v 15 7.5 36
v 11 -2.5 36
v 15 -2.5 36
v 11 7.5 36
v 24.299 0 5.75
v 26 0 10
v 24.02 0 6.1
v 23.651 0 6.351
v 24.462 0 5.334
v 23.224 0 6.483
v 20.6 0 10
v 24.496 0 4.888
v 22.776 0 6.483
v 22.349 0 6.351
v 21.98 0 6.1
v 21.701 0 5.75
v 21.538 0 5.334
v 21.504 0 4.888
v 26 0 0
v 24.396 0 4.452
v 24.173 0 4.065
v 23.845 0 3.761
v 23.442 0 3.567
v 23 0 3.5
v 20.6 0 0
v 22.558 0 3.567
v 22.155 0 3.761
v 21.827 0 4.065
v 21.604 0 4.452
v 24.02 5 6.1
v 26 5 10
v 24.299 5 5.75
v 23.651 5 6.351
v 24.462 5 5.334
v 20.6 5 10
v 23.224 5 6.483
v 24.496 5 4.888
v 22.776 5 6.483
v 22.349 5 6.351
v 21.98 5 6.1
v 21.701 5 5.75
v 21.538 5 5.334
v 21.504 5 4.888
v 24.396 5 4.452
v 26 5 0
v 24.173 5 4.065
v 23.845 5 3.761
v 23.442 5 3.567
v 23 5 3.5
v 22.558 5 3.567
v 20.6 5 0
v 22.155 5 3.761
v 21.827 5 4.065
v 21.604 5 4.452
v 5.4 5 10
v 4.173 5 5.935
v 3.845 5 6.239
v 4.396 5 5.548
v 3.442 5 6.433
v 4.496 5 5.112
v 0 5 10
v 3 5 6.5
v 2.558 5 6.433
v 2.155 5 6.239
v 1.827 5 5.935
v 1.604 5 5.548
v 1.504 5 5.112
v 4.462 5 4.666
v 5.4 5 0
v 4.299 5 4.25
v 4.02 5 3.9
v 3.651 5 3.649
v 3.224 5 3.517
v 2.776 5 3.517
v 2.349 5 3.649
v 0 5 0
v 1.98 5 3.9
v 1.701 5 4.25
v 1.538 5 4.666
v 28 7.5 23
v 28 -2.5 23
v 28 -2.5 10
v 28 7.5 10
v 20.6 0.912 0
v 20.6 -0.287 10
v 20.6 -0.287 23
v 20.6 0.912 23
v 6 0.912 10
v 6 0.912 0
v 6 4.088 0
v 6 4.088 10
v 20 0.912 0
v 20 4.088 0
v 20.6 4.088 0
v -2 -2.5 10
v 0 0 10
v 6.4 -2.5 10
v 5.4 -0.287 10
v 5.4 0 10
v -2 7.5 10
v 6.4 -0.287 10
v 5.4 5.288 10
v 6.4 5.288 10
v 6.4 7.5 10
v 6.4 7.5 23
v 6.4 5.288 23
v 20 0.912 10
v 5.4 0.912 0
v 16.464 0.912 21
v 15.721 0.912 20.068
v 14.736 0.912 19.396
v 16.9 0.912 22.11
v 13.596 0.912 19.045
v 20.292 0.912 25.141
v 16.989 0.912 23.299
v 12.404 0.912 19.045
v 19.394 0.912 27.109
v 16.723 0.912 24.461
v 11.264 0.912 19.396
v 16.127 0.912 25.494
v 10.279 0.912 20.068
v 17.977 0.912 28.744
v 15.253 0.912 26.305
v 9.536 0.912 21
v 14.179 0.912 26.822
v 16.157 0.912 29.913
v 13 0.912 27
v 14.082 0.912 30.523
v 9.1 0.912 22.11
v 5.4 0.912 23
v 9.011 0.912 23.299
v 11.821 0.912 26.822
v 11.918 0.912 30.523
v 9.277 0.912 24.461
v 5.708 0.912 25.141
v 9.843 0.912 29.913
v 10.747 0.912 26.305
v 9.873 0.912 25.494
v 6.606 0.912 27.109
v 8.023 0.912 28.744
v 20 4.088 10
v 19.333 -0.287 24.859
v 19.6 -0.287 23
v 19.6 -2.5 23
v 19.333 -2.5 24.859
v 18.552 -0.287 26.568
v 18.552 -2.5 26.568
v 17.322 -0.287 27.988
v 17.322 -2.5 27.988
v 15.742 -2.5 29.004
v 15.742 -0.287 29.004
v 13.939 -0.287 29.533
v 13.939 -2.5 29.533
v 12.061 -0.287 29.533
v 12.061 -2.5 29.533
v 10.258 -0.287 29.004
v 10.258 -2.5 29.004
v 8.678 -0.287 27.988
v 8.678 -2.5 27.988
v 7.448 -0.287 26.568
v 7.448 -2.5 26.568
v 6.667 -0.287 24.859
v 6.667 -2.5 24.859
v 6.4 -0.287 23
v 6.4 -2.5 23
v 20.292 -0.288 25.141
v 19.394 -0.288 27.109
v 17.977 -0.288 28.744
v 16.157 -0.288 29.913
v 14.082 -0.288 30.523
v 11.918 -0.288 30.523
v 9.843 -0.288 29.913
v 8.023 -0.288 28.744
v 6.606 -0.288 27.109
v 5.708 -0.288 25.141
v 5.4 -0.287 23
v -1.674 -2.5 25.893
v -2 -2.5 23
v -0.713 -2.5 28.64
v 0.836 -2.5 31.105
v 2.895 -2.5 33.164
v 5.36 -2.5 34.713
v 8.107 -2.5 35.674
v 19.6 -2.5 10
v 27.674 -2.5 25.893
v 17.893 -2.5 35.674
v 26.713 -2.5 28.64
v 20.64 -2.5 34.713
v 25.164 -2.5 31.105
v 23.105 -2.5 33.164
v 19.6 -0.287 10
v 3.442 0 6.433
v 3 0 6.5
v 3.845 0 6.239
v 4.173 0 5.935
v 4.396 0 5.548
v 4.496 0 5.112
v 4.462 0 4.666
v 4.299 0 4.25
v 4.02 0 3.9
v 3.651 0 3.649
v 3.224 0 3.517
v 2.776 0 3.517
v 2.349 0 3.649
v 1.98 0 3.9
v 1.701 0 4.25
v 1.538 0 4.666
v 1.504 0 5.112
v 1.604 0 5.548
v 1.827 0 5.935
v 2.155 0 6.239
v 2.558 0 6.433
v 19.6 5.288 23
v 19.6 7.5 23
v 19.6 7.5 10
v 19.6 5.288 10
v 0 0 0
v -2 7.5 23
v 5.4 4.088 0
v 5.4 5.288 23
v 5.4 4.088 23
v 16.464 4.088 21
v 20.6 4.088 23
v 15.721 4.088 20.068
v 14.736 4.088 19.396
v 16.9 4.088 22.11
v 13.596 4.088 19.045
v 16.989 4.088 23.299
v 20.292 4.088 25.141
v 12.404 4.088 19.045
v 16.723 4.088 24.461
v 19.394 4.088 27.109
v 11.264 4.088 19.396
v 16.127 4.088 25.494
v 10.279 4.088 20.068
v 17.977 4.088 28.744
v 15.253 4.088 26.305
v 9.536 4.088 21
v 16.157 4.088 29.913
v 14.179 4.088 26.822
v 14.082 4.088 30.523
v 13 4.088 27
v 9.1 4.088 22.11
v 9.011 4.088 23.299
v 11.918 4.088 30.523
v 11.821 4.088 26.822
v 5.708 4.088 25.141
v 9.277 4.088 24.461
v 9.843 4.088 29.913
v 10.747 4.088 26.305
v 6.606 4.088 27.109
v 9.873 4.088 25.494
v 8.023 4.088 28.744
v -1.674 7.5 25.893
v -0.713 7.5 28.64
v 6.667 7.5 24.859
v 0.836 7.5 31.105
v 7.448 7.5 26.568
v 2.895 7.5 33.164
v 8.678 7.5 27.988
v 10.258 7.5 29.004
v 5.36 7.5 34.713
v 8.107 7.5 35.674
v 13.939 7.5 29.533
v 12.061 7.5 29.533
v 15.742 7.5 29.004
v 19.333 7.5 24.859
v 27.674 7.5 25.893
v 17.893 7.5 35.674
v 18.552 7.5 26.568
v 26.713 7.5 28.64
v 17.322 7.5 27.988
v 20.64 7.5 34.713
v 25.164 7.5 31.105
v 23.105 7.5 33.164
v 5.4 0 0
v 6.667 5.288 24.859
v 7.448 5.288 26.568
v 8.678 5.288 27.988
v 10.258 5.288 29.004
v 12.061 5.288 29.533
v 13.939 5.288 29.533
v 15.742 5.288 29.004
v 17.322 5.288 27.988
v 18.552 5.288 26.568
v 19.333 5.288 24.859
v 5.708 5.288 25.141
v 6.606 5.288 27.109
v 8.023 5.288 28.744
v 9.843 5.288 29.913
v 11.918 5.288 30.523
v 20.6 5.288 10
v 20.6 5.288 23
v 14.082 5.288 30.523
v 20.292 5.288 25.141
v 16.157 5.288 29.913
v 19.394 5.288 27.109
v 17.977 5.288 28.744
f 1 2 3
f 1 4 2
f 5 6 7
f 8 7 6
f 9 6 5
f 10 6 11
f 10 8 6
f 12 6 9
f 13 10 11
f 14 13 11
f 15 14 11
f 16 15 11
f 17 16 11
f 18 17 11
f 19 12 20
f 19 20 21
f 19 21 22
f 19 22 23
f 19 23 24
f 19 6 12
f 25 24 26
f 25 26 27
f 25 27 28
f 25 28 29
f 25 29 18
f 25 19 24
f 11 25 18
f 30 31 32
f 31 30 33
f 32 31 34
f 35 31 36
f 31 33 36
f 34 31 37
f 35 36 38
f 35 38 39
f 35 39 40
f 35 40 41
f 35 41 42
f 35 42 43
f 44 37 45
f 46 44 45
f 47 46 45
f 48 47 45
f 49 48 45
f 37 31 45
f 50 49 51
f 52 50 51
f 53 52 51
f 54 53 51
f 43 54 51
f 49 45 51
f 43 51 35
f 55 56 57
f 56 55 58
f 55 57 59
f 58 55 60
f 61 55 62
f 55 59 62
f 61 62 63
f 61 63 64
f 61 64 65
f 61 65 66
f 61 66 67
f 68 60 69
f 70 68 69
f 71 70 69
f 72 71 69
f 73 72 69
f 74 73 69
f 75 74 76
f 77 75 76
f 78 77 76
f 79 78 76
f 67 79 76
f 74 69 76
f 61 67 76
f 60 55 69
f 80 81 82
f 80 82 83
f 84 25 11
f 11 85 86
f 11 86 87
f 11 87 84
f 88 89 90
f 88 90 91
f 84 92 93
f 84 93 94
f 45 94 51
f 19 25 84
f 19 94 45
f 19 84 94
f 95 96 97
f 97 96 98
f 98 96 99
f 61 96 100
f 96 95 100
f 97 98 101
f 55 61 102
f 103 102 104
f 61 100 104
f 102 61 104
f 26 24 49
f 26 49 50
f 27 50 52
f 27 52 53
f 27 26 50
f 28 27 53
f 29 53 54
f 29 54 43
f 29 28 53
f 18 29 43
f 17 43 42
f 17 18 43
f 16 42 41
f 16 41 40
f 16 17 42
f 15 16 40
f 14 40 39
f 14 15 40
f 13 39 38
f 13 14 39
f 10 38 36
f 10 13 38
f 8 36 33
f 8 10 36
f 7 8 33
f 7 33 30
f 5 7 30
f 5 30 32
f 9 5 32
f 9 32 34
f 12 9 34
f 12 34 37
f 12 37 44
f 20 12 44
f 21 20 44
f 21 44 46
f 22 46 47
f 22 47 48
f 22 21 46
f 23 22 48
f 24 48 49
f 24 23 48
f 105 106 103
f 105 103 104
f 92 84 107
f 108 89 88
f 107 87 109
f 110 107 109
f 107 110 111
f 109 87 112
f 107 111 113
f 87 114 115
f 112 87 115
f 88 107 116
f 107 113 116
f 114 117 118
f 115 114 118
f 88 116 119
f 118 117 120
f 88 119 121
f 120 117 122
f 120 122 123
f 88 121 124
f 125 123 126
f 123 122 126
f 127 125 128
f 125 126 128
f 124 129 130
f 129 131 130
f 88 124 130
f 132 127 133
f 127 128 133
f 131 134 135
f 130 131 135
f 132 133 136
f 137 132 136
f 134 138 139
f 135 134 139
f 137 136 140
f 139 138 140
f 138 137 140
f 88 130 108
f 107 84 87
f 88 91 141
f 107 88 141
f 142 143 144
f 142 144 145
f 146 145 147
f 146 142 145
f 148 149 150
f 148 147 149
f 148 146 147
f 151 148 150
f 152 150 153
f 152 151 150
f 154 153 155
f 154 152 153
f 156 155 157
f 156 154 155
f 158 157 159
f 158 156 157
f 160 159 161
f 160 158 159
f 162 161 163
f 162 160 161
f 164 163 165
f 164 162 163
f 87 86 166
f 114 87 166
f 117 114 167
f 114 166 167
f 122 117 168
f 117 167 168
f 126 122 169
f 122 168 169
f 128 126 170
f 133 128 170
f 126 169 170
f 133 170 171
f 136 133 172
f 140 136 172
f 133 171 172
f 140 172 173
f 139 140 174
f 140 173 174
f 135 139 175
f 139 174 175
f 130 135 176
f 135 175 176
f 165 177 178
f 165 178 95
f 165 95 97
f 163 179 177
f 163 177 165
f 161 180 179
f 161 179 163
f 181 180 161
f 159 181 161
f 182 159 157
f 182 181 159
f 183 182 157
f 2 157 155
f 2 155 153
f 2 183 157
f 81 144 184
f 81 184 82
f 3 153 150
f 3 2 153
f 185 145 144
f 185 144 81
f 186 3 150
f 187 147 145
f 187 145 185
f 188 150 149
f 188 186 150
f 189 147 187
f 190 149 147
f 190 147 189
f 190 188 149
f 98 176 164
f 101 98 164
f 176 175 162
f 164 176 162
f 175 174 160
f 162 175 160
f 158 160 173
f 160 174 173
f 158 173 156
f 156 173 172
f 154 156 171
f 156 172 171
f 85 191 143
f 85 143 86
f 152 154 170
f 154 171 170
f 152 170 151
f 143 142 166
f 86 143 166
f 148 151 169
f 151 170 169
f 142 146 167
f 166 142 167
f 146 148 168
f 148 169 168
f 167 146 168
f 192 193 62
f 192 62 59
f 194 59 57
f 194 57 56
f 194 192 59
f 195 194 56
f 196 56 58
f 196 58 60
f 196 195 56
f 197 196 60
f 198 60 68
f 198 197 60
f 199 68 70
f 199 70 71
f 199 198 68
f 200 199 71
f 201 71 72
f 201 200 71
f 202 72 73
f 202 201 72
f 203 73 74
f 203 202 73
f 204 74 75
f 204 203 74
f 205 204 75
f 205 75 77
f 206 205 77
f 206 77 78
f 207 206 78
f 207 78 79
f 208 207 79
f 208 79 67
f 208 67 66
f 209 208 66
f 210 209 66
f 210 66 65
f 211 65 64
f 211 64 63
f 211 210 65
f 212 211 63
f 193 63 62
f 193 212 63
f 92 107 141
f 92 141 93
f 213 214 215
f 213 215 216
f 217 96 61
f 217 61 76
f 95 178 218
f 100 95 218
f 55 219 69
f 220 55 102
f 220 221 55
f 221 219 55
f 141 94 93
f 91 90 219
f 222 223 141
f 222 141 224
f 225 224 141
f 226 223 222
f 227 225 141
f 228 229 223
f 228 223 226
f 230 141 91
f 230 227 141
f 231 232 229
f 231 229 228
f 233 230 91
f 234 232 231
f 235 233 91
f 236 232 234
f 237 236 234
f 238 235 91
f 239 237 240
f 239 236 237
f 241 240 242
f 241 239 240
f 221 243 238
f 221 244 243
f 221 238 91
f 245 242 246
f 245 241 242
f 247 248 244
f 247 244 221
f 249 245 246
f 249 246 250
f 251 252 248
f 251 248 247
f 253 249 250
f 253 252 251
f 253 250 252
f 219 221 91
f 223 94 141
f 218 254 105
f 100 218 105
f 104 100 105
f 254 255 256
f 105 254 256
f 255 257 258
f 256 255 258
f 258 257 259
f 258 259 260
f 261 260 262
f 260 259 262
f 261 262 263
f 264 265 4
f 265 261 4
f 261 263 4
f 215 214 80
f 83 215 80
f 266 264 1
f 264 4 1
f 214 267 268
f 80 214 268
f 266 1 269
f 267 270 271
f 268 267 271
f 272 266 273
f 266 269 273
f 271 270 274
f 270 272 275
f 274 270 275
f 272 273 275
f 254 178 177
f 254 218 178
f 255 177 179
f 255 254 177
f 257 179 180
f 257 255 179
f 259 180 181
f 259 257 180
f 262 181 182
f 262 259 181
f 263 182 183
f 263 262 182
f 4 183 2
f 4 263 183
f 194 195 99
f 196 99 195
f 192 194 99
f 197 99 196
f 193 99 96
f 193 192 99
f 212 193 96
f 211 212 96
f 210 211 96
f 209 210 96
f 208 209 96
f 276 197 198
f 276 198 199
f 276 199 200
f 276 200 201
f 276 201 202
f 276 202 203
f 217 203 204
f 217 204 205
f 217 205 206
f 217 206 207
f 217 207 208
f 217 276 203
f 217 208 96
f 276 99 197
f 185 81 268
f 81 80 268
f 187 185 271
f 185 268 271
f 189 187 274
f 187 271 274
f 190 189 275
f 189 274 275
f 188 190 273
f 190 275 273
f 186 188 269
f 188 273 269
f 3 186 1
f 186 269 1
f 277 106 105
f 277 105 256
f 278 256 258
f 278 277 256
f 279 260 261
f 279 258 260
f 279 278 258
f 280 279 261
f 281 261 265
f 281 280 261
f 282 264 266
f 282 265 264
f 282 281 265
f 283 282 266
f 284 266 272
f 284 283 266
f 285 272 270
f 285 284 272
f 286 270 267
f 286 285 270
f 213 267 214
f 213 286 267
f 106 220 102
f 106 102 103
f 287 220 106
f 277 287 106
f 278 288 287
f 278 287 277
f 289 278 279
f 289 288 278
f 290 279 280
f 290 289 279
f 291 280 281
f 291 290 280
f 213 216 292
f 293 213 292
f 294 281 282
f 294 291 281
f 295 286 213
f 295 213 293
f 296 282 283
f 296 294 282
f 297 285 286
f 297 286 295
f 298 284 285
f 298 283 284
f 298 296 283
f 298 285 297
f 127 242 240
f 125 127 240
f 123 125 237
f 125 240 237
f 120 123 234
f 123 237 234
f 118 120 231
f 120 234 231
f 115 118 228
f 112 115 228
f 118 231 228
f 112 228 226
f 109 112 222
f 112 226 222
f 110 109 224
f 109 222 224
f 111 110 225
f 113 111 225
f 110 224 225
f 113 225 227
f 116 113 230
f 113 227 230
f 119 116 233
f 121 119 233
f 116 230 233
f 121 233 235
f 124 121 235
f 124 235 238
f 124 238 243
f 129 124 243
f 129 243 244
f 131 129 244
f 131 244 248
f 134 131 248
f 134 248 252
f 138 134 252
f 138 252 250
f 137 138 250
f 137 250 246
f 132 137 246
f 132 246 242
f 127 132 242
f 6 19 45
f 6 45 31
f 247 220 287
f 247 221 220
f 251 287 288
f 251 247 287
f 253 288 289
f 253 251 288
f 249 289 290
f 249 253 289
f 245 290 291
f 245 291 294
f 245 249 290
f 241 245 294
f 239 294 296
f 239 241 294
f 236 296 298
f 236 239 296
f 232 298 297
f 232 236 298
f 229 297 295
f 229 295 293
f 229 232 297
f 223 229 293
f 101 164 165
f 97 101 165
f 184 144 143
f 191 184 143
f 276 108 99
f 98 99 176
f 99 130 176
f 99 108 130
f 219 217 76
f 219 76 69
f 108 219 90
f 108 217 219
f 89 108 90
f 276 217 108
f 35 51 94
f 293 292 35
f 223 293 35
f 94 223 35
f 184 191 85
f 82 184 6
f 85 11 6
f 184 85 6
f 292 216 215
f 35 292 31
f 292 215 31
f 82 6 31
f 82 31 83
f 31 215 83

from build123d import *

# Parameters (mm, degrees)
SKETCH1_R           = 1.5
BOSS_EXTRUDE1_DEPTH = 5
SKETCH2_W           = 30
SKETCH2_H           = 2.5
BOSS_EXTRUDE2_DEPTH = 26
FILLET1_R           = 13
CUT_EXTRUDE1_START  = -13
CUT_EXTRUDE1_DEPTH  = 52.939054945
SKETCH4_R           = 7.6
CUT_EXTRUDE2_DEPTH  = 1.2
SKETCH5_R           = 6.6
CUT_EXTRUDE3_DEPTH  = 47.080312024
CUT_EXTRUDE4_START  = 1.2
SKETCH6_R           = 7.6
CUT_EXTRUDE4_DEPTH  = 1.2
SKETCH7_R           = 6.6
CUT_EXTRUDE5_DEPTH  = 47.080312024
SKETCH8_R           = 4
CUT_EXTRUDE6_DEPTH  = 47.080312024


with BuildPart() as part:
    # Sketch1 → Boss-Extrude1 (new body)
    with BuildSketch(Plane(origin=(0, 0, 0), x_dir=(1, 0, 0), z_dir=(0, 1, 0))):
        Polygon((0, 0), (6, 0), (6, -10), (20, -10), (20, 0), (26, 0), (26, -10), (28, -10), (28, -36), (-2, -36), (-2, -10), (0, -10), align=None)
        with Locations(Location((3, -5, 0), (0, 0, 270))):
            Circle(SKETCH1_R, mode=Mode.SUBTRACT)
        with Locations(Location((23, -5, 0), (0, 0, 90))):
            Circle(SKETCH1_R, mode=Mode.SUBTRACT)
    extrude(amount=BOSS_EXTRUDE1_DEPTH)

    # Sketch2 → Boss-Extrude2 (add)
    with BuildSketch(Plane.XY.offset(36)):
        with Locations((13, 6.25)):
            Rectangle(SKETCH2_W, SKETCH2_H)
        with Locations((13, -1.25)):
            Rectangle(SKETCH2_W, SKETCH2_H)
    extrude(amount=-BOSS_EXTRUDE2_DEPTH)

    # Fillet1
    fillet1_edges = [part.edges().sort_by_distance(p)[0] for p in [
        (28, 2.5, 36),
        (-2, 2.5, 36),
    ]]
    fillet(fillet1_edges, radius=FILLET1_R)

    # Sketch3 → Cut-Extrude1 (cut)
    with BuildSketch(Plane(origin=(0, 0, 10), x_dir=(-1, 0, 0), z_dir=(0, 0, -1)).offset(CUT_EXTRUDE1_START)):
        Polygon((-19.6, 7.5), (-19.6, 5.2875), (-20.6, 5.2875), (-20.6, 4.0875), (-13, 4.0875), (-5.4, 4.0875), (-5.4, 5.2875), (-6.4, 5.2875), (-6.4, 7.5), align=None)
    cut_extrude1 = extrude(amount=CUT_EXTRUDE1_DEPTH, mode=Mode.SUBTRACT)

    # Sketch4 → Cut-Extrude2 (cut)
    with BuildSketch(Plane(origin=(0, 4.0875, 0), x_dir=(1, 0, 0), z_dir=(0, 1, 0))):
        with Locations((13, -23)):
            Circle(SKETCH4_R)
    extrude(amount=CUT_EXTRUDE2_DEPTH, mode=Mode.SUBTRACT)

    # Sketch5 → Cut-Extrude3 (cut, through all)
    with BuildSketch(Plane(origin=(0, 4.0875, 0), x_dir=(1, 0, 0), z_dir=(0, 1, 0))):
        with Locations((13, -23)):
            Circle(SKETCH5_R)
    extrude(amount=CUT_EXTRUDE3_DEPTH, mode=Mode.SUBTRACT)

    # Mirror1: Cut-Extrude1 across plane
    add(cut_extrude1.mirror(Plane(origin=(0, 2.5, 0), x_dir=(0, 0, 1), z_dir=(0, -1, 0))), mode=Mode.SUBTRACT)

    # Sketch6 → Cut-Extrude4 (cut)
    with BuildSketch(Plane.XZ.offset(-0.9125).offset(CUT_EXTRUDE4_START)):
        with Locations((13, 23)):
            Circle(SKETCH6_R)
    extrude(amount=-CUT_EXTRUDE4_DEPTH, mode=Mode.SUBTRACT)

    # Sketch7 → Cut-Extrude5 (cut, through all)
    with BuildSketch(Plane.XZ.offset(-0.9125)):
        with Locations((13, 23)):
            Circle(SKETCH7_R)
    extrude(amount=CUT_EXTRUDE5_DEPTH, mode=Mode.SUBTRACT)

    # Sketch8 → Cut-Extrude6 (cut, through all)
    with BuildSketch(Plane(origin=(0, 4.0875, 0), x_dir=(1, 0, 0), z_dir=(0, 1, 0))):
        with Locations(Location((13, -23, 0), (0, 0, 270))):
            Circle(SKETCH8_R)
    extrude(amount=-CUT_EXTRUDE6_DEPTH, mode=Mode.SUBTRACT)


solid = part.part
